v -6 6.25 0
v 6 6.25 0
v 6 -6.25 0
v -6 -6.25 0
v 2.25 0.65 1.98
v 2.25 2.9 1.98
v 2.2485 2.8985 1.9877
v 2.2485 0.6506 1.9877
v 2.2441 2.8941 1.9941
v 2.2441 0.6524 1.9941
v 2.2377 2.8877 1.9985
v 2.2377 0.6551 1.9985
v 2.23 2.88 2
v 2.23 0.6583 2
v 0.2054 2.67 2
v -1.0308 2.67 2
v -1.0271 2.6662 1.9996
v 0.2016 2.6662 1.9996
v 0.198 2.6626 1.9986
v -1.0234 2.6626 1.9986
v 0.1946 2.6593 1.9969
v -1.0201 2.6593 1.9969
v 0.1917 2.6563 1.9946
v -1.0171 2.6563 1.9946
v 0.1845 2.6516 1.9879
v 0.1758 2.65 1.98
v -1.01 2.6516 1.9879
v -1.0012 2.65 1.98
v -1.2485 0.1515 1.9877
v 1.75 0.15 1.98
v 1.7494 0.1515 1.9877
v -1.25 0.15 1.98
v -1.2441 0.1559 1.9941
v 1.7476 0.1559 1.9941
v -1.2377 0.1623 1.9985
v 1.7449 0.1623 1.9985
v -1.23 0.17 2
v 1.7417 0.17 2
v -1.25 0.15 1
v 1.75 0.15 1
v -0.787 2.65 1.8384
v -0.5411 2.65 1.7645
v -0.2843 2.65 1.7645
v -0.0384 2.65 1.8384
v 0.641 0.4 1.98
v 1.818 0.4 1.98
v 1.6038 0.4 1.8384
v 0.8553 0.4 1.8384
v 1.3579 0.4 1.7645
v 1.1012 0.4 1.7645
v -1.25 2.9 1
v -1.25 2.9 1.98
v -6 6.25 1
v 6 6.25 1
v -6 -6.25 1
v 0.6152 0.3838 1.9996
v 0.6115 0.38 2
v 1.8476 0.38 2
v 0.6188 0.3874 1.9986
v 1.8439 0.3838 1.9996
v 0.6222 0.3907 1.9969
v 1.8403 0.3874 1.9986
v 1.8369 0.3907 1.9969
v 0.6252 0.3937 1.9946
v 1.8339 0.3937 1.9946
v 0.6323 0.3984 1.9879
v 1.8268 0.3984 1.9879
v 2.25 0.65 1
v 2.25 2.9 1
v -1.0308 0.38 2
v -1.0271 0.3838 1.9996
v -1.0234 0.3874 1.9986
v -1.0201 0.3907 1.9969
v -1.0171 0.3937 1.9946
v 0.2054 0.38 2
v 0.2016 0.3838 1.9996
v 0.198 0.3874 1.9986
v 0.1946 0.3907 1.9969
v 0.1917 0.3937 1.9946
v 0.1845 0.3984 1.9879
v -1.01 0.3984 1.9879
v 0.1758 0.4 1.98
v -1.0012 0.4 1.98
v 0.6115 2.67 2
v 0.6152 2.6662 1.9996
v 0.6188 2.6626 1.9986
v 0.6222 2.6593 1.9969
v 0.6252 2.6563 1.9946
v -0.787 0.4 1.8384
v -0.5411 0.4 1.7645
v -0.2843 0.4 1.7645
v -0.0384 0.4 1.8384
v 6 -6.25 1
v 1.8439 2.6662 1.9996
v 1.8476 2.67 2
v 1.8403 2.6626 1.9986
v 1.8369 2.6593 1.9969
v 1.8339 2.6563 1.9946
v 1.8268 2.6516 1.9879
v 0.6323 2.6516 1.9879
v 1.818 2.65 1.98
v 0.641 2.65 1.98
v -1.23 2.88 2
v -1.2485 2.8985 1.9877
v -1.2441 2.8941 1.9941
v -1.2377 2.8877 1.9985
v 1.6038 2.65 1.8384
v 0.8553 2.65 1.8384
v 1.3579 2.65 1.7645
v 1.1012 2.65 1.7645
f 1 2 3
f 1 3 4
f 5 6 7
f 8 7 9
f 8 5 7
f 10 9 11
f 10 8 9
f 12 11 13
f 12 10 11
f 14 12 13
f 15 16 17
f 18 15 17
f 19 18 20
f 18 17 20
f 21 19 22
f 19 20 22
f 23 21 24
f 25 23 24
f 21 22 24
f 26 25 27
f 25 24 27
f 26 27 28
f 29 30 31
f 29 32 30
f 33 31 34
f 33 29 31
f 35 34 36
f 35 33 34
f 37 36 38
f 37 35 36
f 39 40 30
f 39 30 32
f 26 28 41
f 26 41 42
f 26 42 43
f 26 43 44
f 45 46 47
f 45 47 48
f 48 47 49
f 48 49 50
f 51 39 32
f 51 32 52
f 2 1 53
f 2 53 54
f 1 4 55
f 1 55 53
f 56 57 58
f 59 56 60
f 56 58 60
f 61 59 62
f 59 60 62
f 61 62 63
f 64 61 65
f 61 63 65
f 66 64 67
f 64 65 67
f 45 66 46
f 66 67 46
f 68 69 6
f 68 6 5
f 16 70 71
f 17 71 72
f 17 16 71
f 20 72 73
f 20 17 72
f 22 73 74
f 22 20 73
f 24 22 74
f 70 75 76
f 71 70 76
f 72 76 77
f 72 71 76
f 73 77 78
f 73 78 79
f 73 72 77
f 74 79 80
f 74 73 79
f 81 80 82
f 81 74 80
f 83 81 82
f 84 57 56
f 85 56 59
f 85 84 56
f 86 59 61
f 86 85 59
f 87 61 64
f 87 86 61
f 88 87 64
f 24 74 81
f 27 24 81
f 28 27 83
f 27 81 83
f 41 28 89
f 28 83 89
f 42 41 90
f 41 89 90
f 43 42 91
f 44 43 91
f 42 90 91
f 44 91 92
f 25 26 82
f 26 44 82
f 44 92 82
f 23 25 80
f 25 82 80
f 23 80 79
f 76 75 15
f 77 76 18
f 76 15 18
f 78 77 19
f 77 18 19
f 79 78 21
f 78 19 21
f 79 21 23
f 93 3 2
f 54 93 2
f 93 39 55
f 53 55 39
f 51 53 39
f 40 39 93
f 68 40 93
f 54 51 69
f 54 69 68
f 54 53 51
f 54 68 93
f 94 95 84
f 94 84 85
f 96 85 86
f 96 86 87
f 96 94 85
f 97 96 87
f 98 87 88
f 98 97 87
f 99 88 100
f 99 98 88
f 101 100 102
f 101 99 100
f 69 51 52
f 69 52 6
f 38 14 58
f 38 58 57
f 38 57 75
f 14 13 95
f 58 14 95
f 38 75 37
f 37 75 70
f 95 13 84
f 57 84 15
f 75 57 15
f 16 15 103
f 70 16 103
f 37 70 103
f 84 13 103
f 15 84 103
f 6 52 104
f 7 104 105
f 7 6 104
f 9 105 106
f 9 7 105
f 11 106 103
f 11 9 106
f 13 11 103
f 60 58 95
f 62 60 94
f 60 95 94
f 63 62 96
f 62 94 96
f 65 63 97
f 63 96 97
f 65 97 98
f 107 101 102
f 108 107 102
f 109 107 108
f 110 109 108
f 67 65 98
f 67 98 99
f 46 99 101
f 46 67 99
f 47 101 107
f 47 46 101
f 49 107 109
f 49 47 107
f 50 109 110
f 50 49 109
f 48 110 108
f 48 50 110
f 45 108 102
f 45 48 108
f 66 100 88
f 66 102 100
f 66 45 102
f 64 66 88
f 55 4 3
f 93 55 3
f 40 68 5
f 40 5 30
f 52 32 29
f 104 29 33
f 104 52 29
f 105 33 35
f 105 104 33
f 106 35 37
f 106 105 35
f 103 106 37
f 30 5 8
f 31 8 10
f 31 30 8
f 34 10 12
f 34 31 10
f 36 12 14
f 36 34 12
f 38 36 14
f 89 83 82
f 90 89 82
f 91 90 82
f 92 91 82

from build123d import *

# Parameters (mm, degrees)
ESQUISSE1_W             = 12
ESQUISSE1_H             = 12.5
EXTRUSION1_DEPTH        = 1
EXTRUSION2_DEPTH        = 2
ENL_V_MAT_EXTRU_1_DEPTH = 2.25
CONG_1_R                = 0.02


with BuildPart() as part:
    # Esquisse1 → Extrusion1 (new body)
    with BuildSketch(Plane.XY):
        Rectangle(ESQUISSE1_W, ESQUISSE1_H)
    extrude(amount=EXTRUSION1_DEPTH)

    # Esquisse3 → Extrusion2 (add)
    with BuildSketch(Plane.XY):
        Polygon((-1.25, 2.9), (2.25, 2.9), (2.25, 0.65), (1.75, 0.15), (-1.25, 0.15), align=None)
    extrude(amount=EXTRUSION2_DEPTH)

    # Esquisse4 → Enlèv. mat.-Extru.1 (cut)
    with BuildSketch(Plane.XZ.offset(-0.4)):
        with BuildLine():
            Line((0.619431951, 2), (1.839642881, 2))
            ThreePointArc((1.839642881, 2), (1.229537416, 1.755105285), (0.619431951, 2))
        make_face()
        with BuildLine():
            Line((0.197380528, 2), (-1.022830402, 2))
            ThreePointArc((-1.022830402, 2), (-0.412724937, 1.755105285), (0.197380528, 2))
        make_face()
    extrude(amount=-ENL_V_MAT_EXTRU_1_DEPTH, mode=Mode.SUBTRACT)

    # Congé1
    cong_1_edges = [part.edges().sort_by_distance(p)[0] for p in [
        (0.5, 2.9, 2),
        (2.25, 1.775, 2),
        (2, 0.4, 2),
        (0.25, 0.15, 2),
        (-1.25, 1.525, 2),
        (1.229537416, 0.4, 2),
        (0.619431951, 1.525, 2),
        (1.229537416, 2.65, 2),
        (1.839642881, 1.525, 2),
        (-0.412724937, 0.4, 2),
        (-1.022830402, 1.525, 2),
        (-0.412724937, 2.65, 2),
        (0.197380528, 1.525, 2),
    ]]
    fillet(cong_1_edges, radius=CONG_1_R)


solid = part.part
